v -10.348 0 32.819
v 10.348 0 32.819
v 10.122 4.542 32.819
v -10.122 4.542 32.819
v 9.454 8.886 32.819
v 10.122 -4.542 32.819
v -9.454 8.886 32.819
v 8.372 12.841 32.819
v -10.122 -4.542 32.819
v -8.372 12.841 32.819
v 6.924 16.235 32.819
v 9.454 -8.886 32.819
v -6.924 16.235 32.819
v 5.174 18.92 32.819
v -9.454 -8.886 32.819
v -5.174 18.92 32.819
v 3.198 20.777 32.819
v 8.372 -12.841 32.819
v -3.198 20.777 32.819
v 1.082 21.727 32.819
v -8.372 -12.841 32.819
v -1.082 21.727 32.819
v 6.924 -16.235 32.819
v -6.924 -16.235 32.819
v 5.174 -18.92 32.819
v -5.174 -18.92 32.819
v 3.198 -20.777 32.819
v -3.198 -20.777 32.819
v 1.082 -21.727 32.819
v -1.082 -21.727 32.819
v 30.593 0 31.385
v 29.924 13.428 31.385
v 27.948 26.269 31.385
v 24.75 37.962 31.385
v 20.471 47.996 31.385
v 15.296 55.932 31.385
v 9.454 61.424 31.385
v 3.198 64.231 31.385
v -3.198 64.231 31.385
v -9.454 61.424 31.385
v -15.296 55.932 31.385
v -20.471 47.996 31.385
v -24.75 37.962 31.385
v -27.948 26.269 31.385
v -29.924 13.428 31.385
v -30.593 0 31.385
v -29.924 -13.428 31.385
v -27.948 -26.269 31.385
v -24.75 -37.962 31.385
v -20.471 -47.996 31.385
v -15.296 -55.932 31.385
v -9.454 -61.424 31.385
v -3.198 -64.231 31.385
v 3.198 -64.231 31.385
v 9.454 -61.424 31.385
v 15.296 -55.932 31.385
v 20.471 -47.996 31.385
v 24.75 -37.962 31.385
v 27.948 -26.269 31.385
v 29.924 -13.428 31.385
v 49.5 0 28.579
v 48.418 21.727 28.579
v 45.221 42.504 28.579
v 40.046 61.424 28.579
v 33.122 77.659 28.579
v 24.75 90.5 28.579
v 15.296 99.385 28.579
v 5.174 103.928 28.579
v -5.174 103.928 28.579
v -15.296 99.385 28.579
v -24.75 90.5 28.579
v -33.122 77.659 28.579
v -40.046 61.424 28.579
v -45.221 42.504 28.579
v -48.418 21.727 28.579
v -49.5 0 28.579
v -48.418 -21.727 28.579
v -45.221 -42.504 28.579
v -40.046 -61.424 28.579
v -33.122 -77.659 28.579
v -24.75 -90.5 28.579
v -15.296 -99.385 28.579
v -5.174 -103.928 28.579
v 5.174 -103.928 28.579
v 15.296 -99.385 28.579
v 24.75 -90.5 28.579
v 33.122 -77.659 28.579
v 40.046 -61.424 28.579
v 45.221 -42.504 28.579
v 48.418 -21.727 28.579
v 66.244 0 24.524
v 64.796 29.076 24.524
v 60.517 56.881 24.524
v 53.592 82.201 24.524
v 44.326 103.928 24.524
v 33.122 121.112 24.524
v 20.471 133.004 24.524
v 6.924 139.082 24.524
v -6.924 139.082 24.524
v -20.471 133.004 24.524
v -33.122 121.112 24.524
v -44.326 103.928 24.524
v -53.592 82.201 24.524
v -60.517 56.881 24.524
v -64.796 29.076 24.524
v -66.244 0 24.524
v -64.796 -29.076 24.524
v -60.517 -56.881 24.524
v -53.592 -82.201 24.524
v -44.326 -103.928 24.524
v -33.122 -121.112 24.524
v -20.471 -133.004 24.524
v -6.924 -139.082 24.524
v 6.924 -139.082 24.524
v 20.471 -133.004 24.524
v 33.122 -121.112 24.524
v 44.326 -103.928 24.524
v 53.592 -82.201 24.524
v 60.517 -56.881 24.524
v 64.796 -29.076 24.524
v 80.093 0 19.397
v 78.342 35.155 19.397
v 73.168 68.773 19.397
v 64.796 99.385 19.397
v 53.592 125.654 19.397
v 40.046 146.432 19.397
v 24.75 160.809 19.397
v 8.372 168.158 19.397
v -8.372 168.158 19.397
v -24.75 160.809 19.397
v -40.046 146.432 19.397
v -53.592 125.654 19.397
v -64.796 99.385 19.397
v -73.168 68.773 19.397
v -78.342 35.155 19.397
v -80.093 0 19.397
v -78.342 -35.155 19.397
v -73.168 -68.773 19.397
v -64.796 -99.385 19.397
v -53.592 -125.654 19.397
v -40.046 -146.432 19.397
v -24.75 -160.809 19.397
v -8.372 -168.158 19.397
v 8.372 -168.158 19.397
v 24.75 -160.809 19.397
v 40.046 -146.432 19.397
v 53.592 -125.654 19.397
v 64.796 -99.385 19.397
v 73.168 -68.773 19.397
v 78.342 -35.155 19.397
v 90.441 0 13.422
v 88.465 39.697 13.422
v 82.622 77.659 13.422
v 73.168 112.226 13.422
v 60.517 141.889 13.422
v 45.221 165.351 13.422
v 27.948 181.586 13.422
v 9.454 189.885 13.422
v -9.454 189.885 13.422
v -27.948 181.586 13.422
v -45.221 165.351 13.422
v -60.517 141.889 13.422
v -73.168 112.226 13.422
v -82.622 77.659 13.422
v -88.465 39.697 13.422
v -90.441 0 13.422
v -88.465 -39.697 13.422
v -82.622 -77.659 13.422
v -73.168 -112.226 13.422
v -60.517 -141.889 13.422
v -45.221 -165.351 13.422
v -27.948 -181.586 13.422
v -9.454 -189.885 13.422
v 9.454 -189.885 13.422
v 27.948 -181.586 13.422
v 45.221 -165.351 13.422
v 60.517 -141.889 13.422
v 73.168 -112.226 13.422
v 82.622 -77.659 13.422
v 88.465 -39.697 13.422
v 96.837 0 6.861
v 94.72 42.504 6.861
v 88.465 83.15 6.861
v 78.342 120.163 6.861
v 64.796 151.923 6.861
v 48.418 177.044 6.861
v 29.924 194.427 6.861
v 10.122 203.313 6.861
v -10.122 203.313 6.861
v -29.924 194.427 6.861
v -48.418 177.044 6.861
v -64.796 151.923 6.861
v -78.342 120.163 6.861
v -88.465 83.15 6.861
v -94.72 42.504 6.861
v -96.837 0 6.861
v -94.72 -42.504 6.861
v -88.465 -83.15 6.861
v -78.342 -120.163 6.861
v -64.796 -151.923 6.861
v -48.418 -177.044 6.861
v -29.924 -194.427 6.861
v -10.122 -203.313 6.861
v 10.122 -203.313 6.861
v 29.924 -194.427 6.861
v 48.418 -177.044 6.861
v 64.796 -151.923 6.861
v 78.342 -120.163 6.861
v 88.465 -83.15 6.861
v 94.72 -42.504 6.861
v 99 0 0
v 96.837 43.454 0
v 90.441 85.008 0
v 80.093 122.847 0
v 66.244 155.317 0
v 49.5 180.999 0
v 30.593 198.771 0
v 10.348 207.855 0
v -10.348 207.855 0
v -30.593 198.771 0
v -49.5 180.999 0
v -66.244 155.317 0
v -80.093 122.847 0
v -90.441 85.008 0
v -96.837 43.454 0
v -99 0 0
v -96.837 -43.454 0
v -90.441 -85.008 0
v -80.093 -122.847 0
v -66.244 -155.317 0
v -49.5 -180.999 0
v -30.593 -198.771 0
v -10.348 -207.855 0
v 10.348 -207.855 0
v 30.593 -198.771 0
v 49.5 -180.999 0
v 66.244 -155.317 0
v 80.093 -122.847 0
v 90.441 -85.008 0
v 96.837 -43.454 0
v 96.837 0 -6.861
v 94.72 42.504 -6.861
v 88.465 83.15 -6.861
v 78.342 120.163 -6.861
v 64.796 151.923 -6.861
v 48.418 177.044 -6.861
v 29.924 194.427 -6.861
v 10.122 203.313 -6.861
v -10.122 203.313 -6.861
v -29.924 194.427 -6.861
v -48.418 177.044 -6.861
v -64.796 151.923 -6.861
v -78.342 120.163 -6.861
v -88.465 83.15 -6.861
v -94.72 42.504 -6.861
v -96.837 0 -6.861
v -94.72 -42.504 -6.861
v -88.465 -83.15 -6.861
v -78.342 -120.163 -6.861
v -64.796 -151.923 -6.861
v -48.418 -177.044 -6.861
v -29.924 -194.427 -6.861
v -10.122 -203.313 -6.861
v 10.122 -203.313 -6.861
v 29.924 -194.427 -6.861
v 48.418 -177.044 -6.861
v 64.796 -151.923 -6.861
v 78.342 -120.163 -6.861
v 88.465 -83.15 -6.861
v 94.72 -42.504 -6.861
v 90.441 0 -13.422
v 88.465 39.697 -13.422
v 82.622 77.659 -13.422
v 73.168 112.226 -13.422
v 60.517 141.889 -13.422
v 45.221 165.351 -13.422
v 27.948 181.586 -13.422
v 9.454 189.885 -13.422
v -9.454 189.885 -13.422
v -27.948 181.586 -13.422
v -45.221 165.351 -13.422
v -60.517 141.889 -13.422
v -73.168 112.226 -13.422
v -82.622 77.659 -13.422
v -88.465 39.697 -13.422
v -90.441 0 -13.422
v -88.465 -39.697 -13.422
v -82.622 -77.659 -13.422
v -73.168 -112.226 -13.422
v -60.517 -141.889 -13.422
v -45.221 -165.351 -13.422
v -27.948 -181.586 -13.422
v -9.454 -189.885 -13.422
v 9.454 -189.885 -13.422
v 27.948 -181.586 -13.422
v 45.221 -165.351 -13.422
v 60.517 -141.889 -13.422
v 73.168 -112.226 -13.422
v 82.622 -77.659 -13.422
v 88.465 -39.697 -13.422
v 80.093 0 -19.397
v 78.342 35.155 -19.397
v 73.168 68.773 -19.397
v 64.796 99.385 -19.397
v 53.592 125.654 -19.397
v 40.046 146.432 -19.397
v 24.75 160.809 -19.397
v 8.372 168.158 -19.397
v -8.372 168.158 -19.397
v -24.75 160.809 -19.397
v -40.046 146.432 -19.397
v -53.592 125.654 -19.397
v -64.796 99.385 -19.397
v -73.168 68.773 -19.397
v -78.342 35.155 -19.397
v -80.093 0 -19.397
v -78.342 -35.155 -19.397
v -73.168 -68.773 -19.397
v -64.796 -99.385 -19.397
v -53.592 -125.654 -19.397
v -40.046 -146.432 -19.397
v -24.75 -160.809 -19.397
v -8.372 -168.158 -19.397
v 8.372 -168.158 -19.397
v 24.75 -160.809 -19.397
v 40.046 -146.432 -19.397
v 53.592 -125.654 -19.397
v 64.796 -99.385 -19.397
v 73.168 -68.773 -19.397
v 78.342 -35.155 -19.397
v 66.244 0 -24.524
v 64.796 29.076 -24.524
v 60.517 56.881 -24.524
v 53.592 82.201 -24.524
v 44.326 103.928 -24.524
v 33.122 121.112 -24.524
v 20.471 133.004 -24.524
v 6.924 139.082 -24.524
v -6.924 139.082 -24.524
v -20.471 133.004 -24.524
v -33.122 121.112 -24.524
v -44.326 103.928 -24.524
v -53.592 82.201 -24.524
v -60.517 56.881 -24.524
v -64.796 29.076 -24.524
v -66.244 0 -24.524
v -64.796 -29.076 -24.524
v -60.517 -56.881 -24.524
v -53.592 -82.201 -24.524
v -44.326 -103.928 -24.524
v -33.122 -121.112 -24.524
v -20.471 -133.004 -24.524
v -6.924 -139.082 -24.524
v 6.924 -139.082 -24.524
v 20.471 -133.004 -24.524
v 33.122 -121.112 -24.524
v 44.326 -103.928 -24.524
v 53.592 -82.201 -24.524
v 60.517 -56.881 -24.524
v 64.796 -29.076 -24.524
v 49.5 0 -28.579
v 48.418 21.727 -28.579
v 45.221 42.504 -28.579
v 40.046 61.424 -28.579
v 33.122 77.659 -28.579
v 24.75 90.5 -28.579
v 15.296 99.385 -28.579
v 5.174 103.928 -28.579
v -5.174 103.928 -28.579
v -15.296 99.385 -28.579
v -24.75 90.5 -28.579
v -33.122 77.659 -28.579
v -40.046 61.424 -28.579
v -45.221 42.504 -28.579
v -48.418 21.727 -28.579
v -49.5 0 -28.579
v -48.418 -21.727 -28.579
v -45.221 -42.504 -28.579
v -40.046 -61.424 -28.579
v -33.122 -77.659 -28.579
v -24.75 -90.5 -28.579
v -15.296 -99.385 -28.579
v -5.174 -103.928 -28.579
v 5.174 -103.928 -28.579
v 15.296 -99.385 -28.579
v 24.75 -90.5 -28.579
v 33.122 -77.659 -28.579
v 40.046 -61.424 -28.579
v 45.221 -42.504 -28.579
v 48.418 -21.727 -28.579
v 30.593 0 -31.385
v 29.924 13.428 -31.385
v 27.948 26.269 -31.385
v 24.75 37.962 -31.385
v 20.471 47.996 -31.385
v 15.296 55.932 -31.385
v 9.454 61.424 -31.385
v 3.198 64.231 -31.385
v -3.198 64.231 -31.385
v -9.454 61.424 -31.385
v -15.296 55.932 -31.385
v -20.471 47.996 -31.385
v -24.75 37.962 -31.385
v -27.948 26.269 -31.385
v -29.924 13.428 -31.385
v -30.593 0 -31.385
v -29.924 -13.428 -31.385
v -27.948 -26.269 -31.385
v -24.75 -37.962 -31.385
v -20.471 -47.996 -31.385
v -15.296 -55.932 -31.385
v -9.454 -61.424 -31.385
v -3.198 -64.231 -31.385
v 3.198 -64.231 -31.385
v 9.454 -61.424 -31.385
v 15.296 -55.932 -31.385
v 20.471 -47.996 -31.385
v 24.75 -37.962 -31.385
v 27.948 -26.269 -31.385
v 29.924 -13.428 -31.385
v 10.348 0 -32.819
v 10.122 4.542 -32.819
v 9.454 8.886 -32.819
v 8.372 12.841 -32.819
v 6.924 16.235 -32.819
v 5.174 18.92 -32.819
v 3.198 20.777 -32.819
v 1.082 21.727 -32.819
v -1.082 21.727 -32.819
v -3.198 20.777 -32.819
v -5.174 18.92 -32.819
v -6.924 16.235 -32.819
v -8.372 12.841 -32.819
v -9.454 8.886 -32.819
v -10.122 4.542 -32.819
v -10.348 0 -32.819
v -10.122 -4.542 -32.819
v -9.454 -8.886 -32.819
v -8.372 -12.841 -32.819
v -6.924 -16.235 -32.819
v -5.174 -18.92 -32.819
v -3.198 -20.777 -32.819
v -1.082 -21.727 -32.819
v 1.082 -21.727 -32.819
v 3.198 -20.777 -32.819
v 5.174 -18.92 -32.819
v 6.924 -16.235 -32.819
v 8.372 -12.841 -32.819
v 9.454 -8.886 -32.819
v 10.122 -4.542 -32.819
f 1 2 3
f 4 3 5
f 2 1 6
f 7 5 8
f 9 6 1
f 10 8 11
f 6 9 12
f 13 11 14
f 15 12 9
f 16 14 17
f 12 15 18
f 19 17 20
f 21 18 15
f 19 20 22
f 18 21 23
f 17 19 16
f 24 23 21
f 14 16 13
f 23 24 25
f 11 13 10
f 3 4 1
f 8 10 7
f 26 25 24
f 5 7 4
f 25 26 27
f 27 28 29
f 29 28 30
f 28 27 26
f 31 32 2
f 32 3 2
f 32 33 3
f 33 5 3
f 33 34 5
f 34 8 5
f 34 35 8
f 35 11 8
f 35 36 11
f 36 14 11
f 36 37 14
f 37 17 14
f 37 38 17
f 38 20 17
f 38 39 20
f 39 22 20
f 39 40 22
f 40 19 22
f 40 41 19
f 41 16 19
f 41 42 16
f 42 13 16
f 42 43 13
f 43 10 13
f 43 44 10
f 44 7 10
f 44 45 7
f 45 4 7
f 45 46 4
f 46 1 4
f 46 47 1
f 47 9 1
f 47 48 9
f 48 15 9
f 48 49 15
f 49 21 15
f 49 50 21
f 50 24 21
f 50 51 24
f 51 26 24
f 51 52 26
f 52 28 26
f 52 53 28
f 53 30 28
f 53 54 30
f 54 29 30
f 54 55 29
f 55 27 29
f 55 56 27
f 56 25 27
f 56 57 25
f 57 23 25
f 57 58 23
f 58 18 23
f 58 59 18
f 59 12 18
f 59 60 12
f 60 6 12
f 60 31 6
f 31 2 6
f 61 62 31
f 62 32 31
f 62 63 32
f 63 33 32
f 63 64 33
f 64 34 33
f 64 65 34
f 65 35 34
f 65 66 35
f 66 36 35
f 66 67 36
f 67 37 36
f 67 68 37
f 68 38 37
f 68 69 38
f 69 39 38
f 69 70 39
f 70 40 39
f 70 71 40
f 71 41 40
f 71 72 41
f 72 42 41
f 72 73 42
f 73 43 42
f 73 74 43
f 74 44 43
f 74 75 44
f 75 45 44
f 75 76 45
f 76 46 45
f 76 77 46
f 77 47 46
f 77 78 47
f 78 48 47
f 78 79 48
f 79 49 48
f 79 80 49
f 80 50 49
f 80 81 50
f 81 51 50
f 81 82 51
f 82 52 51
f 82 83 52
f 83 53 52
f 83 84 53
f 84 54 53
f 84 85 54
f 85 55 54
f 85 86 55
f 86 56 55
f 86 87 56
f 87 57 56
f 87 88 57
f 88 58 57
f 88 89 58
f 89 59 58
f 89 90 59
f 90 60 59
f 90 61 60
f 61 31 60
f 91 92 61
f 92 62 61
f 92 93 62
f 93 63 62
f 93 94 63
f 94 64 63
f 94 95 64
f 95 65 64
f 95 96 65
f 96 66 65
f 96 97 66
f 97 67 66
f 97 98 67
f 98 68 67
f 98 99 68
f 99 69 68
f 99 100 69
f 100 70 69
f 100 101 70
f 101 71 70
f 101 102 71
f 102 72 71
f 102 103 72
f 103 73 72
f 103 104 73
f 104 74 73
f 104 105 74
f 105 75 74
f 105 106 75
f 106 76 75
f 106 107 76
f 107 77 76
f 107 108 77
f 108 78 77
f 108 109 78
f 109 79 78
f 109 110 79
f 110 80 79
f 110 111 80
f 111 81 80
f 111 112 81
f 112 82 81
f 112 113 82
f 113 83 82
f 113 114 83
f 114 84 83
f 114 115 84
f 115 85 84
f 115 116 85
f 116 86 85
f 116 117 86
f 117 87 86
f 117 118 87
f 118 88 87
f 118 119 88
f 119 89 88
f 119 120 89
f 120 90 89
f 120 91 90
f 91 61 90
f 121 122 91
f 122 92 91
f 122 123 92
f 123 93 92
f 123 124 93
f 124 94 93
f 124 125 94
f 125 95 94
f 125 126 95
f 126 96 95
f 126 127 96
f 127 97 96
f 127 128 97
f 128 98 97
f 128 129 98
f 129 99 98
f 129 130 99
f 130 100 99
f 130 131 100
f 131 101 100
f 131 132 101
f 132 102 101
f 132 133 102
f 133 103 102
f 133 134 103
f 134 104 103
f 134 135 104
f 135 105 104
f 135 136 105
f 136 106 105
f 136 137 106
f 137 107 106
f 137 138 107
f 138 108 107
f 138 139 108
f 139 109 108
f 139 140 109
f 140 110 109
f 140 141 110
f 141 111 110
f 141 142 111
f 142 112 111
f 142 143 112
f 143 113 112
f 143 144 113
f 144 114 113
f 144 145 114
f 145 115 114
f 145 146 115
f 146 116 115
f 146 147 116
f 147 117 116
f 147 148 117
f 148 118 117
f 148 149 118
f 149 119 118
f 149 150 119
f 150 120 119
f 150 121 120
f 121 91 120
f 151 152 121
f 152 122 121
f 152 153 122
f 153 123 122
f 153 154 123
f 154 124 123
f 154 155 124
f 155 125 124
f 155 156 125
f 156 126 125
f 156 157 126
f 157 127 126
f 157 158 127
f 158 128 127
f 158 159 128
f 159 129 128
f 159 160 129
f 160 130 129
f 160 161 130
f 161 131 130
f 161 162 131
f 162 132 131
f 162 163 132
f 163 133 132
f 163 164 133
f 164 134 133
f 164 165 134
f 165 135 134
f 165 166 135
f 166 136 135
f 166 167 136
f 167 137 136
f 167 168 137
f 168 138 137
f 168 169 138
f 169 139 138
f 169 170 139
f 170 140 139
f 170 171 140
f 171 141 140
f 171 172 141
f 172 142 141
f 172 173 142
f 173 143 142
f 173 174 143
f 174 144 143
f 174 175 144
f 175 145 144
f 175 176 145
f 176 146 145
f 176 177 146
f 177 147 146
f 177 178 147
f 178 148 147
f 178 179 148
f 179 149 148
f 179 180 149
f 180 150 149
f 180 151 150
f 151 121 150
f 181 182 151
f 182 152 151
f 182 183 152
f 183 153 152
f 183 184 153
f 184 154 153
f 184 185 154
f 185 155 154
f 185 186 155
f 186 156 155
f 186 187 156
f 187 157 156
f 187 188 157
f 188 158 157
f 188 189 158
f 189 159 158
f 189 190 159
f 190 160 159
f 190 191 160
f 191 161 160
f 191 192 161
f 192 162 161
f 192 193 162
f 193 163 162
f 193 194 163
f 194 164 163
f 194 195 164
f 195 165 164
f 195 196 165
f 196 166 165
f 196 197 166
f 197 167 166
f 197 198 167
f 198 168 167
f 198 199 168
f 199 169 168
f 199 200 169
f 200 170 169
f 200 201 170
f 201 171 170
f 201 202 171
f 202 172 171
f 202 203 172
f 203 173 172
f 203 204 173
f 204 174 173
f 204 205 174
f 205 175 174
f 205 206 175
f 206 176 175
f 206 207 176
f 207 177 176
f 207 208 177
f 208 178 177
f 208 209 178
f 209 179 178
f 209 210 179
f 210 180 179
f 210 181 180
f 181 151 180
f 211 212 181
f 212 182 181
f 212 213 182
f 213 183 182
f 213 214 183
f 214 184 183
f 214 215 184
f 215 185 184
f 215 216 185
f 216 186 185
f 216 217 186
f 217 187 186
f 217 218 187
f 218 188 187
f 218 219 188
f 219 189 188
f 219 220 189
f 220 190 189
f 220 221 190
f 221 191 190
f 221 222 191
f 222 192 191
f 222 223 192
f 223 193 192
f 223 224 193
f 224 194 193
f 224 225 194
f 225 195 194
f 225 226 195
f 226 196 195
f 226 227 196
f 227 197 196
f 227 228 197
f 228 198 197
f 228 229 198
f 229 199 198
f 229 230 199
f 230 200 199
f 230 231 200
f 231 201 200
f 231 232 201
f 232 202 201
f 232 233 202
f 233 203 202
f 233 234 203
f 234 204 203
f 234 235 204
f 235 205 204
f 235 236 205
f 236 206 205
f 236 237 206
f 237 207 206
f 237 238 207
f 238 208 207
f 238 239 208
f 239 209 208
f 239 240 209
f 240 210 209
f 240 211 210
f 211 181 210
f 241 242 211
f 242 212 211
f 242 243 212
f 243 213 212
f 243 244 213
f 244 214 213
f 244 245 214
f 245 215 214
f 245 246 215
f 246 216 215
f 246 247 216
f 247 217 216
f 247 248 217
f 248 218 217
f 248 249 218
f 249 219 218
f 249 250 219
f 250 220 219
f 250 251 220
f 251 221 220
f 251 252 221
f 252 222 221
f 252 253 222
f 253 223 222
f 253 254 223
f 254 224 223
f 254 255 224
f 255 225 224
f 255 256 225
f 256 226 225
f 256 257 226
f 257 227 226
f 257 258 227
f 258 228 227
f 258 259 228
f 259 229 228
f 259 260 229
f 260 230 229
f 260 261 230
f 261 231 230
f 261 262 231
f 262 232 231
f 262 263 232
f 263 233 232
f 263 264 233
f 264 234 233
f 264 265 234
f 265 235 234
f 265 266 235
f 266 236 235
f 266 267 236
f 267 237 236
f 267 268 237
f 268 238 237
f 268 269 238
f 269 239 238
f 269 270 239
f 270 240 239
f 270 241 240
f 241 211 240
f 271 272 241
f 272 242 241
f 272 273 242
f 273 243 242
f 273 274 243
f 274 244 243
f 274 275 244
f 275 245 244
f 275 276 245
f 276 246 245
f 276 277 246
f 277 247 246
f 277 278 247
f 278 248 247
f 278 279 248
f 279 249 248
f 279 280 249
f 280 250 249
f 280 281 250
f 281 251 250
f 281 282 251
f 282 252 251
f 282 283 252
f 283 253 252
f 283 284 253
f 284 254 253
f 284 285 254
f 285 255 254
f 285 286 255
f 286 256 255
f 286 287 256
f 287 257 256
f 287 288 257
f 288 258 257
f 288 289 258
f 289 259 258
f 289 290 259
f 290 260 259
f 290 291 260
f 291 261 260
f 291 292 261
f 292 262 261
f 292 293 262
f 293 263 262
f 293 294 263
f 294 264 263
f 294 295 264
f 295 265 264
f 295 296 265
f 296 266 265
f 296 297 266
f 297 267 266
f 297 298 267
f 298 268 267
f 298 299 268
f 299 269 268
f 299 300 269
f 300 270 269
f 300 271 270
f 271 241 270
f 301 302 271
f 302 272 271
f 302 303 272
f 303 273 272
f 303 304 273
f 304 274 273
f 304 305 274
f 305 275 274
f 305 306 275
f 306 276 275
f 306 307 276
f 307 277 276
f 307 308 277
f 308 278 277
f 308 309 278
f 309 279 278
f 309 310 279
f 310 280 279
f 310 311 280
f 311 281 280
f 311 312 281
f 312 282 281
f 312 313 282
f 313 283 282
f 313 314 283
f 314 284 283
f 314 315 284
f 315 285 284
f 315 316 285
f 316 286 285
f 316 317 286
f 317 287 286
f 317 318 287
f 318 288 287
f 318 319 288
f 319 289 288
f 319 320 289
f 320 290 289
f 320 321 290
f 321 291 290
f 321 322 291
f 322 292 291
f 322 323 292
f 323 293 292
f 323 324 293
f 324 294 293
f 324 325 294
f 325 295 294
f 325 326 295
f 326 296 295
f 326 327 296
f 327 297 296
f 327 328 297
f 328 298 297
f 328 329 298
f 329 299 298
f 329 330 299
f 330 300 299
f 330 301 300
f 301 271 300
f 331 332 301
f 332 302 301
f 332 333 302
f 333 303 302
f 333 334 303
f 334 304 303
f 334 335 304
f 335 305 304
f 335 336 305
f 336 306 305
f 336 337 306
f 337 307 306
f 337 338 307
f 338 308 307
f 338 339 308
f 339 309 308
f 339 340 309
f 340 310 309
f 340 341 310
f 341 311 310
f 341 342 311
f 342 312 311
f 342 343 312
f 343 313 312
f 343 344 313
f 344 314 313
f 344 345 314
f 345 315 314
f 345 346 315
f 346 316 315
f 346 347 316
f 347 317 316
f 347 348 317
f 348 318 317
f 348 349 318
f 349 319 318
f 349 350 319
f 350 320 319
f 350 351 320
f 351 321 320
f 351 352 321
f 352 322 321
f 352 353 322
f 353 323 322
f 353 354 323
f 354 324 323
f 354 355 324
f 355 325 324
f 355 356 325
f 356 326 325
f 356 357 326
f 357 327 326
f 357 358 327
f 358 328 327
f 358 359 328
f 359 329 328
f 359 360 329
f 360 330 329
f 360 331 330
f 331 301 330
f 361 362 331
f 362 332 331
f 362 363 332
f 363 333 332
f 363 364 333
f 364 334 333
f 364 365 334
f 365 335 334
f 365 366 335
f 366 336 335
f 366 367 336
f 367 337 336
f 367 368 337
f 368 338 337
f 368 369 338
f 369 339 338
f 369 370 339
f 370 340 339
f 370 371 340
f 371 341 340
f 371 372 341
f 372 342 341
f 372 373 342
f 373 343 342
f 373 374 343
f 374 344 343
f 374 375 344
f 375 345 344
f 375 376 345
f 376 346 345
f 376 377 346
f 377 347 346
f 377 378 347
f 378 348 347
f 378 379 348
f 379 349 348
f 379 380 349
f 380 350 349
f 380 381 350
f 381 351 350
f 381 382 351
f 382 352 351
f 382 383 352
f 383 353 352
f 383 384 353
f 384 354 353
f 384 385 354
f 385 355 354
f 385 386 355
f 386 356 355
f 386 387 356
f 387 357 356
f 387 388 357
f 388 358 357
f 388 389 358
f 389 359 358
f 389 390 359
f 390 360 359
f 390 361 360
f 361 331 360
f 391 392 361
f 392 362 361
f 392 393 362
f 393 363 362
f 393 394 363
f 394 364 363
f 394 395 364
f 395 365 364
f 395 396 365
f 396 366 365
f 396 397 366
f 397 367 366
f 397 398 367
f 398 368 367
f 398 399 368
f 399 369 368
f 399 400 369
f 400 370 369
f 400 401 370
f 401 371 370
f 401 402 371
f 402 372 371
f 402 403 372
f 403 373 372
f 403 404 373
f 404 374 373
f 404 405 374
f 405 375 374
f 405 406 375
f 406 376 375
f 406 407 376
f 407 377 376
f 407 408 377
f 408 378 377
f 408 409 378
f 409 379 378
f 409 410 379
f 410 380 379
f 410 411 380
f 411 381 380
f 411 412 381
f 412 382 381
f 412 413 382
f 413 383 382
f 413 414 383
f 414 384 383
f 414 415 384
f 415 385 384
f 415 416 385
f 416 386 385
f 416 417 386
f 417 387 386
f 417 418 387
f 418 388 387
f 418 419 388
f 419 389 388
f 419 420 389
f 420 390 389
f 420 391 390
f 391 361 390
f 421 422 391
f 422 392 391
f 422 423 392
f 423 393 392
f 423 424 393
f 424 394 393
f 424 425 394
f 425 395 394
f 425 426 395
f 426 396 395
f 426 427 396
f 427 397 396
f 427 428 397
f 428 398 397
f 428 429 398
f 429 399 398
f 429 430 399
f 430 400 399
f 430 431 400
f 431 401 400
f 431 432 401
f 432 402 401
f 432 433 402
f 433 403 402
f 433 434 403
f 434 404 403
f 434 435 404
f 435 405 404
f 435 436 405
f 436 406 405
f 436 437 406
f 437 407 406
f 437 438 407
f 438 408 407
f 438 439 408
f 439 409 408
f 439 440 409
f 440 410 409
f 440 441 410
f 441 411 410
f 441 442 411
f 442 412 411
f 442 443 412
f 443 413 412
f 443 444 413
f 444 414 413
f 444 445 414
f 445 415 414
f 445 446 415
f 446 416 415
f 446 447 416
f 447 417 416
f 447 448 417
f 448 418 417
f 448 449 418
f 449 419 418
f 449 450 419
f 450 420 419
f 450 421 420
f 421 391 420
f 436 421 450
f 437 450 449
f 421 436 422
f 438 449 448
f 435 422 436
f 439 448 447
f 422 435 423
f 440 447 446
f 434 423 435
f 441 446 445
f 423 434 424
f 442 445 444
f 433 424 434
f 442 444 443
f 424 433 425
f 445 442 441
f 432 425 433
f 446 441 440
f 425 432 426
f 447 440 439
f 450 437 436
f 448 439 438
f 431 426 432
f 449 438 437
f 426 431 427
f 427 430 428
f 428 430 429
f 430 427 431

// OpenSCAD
// Generated by SolidPython 1.0.1 on 2020-07-29 00:46:49


scale(v = [9, 19, 3]) {
	sphere(r = 11);
}
/***********************************************
*********      SolidPython code:      **********
************************************************
 
# import packages: SolidPython
from solid import *
from solid.utils import *
from itertools import chain, combinations, permutations


class Resize:

    def __init__(self, scad_file):
        self.scad_file = scad_file
        #self.scad_file = import_scad(scad_file)
        # cone/cylinder param:
        self.r1 = 0
        self.r2 = 0
        self.h = 0
        # rectangular prism param:
        self.w = 0
        self.l = 0
        # ellipse param:
        self.r = 0

    # import OpenScad code (file name corresponds to shape)


    # classify shape + parameters
    def assign(self, param1, param2, param3):
        if self.scad_file == 'cone.scad':
            self.r1 = param1
            self.r2 = param2
            self.h = param3
        elif self.scad_file == 'cylinder.scad':
            self.r1 = param1
            self.r2 = param2
            self.h = param3
        elif self.scad_file == 'rectangularPrism.scad':
            self.h = param1
            self.l = param2
            self.w = param3
        else:
            self.r = param1
            self.h = param2

    # resize parameters
    def iterate(self):
        x = range(3, 20, 2)
        i = 1
        if self.scad_file == 'cone.scad':
            tempList = list(permutations(x, 2))
            for temp in tempList:
                param1 = temp[0]
                param2 = temp[1]
                filepath = 'produced_scad_files/' + 'cone' + str(param1) + '_' + str(param2) + '_' + '.scad'
                scad_render_to_file(cylinder(h=param1, r1=param2, r2=0), filepath)

        elif self.scad_file == 'cylinder.scad':
            tempList = list(permutations(x, 3))
            for temp in tempList:
                param1 = temp[0]
                param2 = temp[1]
                filepath = 'produced_scad_files/' + 'cylinder' + str(param1) + '_' + str(param2) + '_' + '.scad'
                scad_render_to_file(cylinder(h=param1, r1=param2, r2=param2), filepath)

        elif self.scad_file == 'rectangularPrism.scad':
            tempList = list(permutations(x, 3))
            for temp in tempList:
                param1 = temp[0]
                param2 = temp[1]
                param3 = temp[2]
                filepath = 'produced_scad_files/' + 'rectangularPrism' + str(param1) + '_' + str(param2) + '_' + str(
                    param3) + '.scad'
                scad_render_to_file(cube(size=(param1, param2, param3)), filepath)

        elif self.scad_file == 'ellipse.scad':
            tempList = list(permutations(x, 4))
            for temp in tempList:
                param1 = temp[0]
                param2 = temp[1]
                param3 = temp[2]
                param4 = temp[3]
                filepath = 'produced_scad_files/' + 'ellipse' + str(param1) + '_' + str(param2) + '_' + str(param3) + '_' + str(param4) + '.scad'
                scad_render_to_file(scale([param1, param2, param3])(sphere(r=param4)), filepath)

    def render_to_scadfile(self):
        scad_render_to_file(scad, 'example.scad') 
 
************************************************/
